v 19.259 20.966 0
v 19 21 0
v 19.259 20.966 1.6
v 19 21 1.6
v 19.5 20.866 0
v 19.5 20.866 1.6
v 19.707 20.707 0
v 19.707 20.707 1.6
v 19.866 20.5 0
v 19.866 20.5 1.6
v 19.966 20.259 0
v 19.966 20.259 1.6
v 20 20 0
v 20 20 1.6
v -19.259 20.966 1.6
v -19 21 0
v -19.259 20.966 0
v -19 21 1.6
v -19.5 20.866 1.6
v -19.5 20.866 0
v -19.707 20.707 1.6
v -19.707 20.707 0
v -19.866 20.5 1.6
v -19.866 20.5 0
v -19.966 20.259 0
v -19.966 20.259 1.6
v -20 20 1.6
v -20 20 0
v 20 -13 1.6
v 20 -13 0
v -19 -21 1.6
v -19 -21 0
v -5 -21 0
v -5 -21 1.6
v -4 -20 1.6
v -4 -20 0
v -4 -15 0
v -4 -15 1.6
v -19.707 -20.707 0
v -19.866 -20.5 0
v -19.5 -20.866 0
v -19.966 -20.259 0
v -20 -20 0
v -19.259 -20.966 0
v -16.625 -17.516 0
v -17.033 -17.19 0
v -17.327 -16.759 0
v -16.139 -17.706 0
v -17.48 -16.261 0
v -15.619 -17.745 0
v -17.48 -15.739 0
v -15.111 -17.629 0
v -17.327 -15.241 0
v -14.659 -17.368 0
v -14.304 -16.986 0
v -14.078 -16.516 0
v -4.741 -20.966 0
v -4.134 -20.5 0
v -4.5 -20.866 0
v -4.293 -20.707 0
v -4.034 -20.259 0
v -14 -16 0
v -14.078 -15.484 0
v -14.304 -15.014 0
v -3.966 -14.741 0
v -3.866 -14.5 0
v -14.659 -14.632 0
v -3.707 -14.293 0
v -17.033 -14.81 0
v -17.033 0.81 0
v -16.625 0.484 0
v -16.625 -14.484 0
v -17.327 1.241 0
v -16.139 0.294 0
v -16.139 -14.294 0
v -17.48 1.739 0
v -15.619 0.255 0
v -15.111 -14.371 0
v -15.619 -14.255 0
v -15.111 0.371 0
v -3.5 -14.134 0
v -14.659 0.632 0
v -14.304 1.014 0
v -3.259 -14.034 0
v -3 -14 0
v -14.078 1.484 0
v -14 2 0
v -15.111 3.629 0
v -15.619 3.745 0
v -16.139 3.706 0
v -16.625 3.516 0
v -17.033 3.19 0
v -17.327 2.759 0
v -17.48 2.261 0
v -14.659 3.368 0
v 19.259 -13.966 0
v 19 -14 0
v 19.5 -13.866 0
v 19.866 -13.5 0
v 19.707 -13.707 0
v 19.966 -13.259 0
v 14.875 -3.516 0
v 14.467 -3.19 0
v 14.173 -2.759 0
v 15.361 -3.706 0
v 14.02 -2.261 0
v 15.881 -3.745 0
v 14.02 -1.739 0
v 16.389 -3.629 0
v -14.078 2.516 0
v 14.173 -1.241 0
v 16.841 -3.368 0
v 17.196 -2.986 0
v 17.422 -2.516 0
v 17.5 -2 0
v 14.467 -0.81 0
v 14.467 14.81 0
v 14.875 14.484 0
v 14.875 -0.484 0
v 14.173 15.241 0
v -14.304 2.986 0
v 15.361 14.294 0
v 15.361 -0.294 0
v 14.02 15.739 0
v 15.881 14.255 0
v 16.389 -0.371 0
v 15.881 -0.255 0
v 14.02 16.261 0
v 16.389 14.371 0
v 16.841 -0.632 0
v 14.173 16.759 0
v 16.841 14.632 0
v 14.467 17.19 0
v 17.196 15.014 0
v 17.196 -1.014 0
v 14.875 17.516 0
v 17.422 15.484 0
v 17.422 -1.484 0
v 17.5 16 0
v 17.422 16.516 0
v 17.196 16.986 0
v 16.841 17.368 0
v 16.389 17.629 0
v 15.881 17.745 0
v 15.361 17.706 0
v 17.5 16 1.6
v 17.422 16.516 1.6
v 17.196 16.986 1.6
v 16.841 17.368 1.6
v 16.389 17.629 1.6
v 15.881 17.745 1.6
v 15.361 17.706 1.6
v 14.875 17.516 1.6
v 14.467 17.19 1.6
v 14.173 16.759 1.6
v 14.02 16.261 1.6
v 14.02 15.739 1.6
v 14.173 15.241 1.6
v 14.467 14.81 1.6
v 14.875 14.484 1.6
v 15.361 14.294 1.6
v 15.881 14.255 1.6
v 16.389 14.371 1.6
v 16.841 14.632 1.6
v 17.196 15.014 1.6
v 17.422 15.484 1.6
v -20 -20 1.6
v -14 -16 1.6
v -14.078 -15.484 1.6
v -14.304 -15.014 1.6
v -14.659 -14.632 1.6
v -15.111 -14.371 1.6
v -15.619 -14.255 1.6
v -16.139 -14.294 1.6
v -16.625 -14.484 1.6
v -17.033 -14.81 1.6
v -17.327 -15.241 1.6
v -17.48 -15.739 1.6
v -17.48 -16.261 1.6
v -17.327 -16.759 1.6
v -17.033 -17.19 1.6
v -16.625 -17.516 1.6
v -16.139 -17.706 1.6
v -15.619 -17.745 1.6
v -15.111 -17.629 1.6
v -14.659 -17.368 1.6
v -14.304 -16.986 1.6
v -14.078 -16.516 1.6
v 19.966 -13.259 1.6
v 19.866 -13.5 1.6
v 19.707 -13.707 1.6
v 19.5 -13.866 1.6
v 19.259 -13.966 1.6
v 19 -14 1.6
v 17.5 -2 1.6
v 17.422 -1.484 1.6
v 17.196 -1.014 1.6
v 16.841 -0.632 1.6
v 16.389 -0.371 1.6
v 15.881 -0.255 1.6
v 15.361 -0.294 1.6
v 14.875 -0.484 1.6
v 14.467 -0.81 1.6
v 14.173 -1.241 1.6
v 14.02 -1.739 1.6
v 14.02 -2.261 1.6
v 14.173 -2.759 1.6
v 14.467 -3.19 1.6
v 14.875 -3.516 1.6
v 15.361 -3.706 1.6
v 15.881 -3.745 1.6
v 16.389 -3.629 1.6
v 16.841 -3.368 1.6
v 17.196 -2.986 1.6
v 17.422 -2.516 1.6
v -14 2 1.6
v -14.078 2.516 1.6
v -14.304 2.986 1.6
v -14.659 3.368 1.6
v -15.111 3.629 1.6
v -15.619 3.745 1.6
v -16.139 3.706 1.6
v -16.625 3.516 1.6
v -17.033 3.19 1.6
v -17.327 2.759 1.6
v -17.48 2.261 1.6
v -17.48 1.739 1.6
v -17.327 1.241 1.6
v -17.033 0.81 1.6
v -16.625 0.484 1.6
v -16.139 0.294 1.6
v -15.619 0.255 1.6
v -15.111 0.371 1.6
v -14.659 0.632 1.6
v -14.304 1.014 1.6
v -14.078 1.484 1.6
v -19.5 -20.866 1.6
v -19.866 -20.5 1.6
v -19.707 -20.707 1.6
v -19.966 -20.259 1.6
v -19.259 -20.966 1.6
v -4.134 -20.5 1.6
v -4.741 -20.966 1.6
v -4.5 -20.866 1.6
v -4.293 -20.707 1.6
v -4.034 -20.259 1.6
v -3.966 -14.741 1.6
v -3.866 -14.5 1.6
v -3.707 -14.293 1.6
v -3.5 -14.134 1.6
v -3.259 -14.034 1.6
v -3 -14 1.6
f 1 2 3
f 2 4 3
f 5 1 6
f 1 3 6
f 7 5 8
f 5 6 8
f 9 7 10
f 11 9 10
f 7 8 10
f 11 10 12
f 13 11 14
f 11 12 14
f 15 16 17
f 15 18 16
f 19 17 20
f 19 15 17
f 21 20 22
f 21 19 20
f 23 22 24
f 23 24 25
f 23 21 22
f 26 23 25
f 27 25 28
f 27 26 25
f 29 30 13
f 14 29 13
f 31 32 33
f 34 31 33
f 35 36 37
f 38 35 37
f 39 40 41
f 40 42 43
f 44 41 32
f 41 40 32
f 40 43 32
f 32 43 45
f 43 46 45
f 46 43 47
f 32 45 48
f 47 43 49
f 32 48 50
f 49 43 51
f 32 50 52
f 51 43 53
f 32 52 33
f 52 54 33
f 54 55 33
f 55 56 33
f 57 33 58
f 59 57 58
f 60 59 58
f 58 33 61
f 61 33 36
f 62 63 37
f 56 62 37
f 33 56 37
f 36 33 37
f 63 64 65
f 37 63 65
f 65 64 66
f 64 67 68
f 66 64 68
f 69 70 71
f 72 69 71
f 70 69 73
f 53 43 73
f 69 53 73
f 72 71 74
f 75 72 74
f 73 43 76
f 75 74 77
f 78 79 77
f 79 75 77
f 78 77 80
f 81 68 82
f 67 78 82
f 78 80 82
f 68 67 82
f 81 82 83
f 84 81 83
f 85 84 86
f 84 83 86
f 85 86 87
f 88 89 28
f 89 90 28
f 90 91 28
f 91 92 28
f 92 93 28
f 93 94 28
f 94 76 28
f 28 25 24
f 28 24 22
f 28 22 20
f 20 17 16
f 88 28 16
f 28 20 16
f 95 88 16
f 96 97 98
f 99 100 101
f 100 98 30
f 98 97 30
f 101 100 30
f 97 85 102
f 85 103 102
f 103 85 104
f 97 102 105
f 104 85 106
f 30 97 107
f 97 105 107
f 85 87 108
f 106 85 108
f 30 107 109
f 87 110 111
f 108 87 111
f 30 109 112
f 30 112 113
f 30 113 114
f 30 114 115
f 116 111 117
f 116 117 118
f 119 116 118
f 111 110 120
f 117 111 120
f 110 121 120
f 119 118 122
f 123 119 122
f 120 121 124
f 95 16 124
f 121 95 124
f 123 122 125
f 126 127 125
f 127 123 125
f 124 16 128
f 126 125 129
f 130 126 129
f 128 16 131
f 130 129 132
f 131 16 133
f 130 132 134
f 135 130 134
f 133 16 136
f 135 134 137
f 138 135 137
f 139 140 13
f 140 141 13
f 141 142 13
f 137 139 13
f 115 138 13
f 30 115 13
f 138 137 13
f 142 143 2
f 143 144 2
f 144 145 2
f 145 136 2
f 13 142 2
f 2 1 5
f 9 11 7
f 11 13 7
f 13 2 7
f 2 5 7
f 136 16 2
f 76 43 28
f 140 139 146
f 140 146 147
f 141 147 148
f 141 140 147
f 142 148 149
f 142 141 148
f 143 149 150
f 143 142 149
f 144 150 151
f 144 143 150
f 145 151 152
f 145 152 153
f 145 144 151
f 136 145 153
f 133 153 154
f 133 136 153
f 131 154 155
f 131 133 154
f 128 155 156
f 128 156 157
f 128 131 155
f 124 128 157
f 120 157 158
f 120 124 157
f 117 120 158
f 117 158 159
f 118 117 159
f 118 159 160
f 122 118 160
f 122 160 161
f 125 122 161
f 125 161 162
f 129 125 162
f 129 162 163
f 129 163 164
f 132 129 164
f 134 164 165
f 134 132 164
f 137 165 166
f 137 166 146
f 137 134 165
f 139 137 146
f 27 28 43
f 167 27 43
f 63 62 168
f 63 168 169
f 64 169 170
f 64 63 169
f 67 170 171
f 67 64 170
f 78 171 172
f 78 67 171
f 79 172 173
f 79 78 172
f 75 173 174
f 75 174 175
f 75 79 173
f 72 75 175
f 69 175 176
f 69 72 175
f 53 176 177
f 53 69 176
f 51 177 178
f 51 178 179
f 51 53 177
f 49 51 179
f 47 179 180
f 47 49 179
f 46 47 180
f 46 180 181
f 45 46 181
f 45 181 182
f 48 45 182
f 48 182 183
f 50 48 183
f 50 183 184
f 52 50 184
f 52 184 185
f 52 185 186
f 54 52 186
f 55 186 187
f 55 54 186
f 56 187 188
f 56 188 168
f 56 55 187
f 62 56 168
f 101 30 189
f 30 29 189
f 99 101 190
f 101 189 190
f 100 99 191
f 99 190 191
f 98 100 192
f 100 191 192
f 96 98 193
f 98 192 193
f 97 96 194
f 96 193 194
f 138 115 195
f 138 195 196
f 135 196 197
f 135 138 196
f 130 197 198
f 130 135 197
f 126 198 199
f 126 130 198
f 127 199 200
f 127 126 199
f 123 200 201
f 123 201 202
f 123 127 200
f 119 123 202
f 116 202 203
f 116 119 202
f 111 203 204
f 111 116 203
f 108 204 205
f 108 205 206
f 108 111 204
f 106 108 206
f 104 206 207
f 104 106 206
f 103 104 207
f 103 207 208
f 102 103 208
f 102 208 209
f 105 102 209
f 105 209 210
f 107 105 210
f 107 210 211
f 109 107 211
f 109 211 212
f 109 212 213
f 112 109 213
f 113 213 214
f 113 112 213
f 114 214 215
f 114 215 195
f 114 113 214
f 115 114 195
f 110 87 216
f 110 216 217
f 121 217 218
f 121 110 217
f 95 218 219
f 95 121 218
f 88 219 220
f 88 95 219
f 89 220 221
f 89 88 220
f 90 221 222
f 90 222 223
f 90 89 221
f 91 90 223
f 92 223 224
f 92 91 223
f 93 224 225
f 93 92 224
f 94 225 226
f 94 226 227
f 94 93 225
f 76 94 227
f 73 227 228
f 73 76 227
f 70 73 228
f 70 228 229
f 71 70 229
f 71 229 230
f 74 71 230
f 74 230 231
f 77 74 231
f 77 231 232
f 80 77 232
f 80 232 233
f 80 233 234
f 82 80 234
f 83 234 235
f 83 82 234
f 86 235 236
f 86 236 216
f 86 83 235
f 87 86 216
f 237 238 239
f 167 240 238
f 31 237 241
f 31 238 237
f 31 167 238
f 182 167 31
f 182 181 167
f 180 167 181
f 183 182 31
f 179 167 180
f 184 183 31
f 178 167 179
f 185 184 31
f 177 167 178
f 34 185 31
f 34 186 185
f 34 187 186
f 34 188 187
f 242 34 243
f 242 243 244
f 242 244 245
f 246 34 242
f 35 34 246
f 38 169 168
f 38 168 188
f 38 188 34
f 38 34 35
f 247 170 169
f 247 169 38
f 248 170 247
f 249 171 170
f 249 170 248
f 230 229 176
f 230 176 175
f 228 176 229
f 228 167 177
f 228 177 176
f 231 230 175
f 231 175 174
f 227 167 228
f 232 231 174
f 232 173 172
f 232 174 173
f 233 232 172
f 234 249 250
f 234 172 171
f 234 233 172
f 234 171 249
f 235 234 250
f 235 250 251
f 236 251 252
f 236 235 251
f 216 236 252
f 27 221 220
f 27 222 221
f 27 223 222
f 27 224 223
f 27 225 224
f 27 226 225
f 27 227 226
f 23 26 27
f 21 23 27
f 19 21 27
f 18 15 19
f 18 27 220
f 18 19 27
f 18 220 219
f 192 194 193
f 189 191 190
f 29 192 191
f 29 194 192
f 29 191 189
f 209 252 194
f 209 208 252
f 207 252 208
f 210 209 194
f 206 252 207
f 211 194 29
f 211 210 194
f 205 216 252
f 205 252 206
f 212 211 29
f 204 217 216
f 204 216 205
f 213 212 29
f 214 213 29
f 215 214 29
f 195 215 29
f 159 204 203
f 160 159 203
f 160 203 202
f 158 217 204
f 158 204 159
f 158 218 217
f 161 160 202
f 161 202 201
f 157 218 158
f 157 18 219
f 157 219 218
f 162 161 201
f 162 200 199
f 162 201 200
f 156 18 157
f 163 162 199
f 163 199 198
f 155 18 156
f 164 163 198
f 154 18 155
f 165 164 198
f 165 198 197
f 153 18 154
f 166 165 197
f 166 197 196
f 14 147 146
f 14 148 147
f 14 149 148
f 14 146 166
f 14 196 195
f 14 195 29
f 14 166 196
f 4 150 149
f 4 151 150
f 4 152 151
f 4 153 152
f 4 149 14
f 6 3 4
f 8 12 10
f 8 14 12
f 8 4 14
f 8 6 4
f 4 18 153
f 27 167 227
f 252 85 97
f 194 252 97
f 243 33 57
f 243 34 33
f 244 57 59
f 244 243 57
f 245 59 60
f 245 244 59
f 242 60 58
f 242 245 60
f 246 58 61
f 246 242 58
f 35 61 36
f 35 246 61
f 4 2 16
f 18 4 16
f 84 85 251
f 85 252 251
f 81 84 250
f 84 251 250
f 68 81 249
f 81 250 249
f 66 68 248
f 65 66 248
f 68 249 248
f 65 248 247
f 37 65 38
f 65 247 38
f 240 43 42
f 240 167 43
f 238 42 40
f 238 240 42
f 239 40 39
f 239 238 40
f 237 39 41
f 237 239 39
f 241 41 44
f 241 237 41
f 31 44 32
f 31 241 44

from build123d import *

# Parameters (mm, degrees)
F0_R     = 1.75
F1_DEPTH = 1.6
F2_R     = 1


with BuildPart() as f1:
    # F0 (on Top) → F1 (new body)
    with BuildSketch(Plane.XY):
        Polygon((20, 21), (-20, 21), (-20, -21), (-4, -21), (-4, -14), (20, -14), align=None)
        with Locations((-15.75, -16)):
            Circle(F0_R, mode=Mode.SUBTRACT)
        with Locations((15.75, -2)):
            Circle(F0_R, mode=Mode.SUBTRACT)
        with Locations((-15.75, 2)):
            Circle(F0_R, mode=Mode.SUBTRACT)
        with Locations((15.75, 16)):
            Circle(F0_R, mode=Mode.SUBTRACT)
    extrude(amount=F1_DEPTH)

    # F2
    f2_edges = [f1.edges().sort_by_distance(p)[0] for p in [
        (-20, -21, 0.8),
        (20, 21, 0.8),
        (-20, 21, 0.8),
        (-4, -14, 0.8),
        (-4, -21, 0.8),
        (20, -14, 0.8),
    ]]
    fillet(f2_edges, radius=F2_R)


solid = f1.part
